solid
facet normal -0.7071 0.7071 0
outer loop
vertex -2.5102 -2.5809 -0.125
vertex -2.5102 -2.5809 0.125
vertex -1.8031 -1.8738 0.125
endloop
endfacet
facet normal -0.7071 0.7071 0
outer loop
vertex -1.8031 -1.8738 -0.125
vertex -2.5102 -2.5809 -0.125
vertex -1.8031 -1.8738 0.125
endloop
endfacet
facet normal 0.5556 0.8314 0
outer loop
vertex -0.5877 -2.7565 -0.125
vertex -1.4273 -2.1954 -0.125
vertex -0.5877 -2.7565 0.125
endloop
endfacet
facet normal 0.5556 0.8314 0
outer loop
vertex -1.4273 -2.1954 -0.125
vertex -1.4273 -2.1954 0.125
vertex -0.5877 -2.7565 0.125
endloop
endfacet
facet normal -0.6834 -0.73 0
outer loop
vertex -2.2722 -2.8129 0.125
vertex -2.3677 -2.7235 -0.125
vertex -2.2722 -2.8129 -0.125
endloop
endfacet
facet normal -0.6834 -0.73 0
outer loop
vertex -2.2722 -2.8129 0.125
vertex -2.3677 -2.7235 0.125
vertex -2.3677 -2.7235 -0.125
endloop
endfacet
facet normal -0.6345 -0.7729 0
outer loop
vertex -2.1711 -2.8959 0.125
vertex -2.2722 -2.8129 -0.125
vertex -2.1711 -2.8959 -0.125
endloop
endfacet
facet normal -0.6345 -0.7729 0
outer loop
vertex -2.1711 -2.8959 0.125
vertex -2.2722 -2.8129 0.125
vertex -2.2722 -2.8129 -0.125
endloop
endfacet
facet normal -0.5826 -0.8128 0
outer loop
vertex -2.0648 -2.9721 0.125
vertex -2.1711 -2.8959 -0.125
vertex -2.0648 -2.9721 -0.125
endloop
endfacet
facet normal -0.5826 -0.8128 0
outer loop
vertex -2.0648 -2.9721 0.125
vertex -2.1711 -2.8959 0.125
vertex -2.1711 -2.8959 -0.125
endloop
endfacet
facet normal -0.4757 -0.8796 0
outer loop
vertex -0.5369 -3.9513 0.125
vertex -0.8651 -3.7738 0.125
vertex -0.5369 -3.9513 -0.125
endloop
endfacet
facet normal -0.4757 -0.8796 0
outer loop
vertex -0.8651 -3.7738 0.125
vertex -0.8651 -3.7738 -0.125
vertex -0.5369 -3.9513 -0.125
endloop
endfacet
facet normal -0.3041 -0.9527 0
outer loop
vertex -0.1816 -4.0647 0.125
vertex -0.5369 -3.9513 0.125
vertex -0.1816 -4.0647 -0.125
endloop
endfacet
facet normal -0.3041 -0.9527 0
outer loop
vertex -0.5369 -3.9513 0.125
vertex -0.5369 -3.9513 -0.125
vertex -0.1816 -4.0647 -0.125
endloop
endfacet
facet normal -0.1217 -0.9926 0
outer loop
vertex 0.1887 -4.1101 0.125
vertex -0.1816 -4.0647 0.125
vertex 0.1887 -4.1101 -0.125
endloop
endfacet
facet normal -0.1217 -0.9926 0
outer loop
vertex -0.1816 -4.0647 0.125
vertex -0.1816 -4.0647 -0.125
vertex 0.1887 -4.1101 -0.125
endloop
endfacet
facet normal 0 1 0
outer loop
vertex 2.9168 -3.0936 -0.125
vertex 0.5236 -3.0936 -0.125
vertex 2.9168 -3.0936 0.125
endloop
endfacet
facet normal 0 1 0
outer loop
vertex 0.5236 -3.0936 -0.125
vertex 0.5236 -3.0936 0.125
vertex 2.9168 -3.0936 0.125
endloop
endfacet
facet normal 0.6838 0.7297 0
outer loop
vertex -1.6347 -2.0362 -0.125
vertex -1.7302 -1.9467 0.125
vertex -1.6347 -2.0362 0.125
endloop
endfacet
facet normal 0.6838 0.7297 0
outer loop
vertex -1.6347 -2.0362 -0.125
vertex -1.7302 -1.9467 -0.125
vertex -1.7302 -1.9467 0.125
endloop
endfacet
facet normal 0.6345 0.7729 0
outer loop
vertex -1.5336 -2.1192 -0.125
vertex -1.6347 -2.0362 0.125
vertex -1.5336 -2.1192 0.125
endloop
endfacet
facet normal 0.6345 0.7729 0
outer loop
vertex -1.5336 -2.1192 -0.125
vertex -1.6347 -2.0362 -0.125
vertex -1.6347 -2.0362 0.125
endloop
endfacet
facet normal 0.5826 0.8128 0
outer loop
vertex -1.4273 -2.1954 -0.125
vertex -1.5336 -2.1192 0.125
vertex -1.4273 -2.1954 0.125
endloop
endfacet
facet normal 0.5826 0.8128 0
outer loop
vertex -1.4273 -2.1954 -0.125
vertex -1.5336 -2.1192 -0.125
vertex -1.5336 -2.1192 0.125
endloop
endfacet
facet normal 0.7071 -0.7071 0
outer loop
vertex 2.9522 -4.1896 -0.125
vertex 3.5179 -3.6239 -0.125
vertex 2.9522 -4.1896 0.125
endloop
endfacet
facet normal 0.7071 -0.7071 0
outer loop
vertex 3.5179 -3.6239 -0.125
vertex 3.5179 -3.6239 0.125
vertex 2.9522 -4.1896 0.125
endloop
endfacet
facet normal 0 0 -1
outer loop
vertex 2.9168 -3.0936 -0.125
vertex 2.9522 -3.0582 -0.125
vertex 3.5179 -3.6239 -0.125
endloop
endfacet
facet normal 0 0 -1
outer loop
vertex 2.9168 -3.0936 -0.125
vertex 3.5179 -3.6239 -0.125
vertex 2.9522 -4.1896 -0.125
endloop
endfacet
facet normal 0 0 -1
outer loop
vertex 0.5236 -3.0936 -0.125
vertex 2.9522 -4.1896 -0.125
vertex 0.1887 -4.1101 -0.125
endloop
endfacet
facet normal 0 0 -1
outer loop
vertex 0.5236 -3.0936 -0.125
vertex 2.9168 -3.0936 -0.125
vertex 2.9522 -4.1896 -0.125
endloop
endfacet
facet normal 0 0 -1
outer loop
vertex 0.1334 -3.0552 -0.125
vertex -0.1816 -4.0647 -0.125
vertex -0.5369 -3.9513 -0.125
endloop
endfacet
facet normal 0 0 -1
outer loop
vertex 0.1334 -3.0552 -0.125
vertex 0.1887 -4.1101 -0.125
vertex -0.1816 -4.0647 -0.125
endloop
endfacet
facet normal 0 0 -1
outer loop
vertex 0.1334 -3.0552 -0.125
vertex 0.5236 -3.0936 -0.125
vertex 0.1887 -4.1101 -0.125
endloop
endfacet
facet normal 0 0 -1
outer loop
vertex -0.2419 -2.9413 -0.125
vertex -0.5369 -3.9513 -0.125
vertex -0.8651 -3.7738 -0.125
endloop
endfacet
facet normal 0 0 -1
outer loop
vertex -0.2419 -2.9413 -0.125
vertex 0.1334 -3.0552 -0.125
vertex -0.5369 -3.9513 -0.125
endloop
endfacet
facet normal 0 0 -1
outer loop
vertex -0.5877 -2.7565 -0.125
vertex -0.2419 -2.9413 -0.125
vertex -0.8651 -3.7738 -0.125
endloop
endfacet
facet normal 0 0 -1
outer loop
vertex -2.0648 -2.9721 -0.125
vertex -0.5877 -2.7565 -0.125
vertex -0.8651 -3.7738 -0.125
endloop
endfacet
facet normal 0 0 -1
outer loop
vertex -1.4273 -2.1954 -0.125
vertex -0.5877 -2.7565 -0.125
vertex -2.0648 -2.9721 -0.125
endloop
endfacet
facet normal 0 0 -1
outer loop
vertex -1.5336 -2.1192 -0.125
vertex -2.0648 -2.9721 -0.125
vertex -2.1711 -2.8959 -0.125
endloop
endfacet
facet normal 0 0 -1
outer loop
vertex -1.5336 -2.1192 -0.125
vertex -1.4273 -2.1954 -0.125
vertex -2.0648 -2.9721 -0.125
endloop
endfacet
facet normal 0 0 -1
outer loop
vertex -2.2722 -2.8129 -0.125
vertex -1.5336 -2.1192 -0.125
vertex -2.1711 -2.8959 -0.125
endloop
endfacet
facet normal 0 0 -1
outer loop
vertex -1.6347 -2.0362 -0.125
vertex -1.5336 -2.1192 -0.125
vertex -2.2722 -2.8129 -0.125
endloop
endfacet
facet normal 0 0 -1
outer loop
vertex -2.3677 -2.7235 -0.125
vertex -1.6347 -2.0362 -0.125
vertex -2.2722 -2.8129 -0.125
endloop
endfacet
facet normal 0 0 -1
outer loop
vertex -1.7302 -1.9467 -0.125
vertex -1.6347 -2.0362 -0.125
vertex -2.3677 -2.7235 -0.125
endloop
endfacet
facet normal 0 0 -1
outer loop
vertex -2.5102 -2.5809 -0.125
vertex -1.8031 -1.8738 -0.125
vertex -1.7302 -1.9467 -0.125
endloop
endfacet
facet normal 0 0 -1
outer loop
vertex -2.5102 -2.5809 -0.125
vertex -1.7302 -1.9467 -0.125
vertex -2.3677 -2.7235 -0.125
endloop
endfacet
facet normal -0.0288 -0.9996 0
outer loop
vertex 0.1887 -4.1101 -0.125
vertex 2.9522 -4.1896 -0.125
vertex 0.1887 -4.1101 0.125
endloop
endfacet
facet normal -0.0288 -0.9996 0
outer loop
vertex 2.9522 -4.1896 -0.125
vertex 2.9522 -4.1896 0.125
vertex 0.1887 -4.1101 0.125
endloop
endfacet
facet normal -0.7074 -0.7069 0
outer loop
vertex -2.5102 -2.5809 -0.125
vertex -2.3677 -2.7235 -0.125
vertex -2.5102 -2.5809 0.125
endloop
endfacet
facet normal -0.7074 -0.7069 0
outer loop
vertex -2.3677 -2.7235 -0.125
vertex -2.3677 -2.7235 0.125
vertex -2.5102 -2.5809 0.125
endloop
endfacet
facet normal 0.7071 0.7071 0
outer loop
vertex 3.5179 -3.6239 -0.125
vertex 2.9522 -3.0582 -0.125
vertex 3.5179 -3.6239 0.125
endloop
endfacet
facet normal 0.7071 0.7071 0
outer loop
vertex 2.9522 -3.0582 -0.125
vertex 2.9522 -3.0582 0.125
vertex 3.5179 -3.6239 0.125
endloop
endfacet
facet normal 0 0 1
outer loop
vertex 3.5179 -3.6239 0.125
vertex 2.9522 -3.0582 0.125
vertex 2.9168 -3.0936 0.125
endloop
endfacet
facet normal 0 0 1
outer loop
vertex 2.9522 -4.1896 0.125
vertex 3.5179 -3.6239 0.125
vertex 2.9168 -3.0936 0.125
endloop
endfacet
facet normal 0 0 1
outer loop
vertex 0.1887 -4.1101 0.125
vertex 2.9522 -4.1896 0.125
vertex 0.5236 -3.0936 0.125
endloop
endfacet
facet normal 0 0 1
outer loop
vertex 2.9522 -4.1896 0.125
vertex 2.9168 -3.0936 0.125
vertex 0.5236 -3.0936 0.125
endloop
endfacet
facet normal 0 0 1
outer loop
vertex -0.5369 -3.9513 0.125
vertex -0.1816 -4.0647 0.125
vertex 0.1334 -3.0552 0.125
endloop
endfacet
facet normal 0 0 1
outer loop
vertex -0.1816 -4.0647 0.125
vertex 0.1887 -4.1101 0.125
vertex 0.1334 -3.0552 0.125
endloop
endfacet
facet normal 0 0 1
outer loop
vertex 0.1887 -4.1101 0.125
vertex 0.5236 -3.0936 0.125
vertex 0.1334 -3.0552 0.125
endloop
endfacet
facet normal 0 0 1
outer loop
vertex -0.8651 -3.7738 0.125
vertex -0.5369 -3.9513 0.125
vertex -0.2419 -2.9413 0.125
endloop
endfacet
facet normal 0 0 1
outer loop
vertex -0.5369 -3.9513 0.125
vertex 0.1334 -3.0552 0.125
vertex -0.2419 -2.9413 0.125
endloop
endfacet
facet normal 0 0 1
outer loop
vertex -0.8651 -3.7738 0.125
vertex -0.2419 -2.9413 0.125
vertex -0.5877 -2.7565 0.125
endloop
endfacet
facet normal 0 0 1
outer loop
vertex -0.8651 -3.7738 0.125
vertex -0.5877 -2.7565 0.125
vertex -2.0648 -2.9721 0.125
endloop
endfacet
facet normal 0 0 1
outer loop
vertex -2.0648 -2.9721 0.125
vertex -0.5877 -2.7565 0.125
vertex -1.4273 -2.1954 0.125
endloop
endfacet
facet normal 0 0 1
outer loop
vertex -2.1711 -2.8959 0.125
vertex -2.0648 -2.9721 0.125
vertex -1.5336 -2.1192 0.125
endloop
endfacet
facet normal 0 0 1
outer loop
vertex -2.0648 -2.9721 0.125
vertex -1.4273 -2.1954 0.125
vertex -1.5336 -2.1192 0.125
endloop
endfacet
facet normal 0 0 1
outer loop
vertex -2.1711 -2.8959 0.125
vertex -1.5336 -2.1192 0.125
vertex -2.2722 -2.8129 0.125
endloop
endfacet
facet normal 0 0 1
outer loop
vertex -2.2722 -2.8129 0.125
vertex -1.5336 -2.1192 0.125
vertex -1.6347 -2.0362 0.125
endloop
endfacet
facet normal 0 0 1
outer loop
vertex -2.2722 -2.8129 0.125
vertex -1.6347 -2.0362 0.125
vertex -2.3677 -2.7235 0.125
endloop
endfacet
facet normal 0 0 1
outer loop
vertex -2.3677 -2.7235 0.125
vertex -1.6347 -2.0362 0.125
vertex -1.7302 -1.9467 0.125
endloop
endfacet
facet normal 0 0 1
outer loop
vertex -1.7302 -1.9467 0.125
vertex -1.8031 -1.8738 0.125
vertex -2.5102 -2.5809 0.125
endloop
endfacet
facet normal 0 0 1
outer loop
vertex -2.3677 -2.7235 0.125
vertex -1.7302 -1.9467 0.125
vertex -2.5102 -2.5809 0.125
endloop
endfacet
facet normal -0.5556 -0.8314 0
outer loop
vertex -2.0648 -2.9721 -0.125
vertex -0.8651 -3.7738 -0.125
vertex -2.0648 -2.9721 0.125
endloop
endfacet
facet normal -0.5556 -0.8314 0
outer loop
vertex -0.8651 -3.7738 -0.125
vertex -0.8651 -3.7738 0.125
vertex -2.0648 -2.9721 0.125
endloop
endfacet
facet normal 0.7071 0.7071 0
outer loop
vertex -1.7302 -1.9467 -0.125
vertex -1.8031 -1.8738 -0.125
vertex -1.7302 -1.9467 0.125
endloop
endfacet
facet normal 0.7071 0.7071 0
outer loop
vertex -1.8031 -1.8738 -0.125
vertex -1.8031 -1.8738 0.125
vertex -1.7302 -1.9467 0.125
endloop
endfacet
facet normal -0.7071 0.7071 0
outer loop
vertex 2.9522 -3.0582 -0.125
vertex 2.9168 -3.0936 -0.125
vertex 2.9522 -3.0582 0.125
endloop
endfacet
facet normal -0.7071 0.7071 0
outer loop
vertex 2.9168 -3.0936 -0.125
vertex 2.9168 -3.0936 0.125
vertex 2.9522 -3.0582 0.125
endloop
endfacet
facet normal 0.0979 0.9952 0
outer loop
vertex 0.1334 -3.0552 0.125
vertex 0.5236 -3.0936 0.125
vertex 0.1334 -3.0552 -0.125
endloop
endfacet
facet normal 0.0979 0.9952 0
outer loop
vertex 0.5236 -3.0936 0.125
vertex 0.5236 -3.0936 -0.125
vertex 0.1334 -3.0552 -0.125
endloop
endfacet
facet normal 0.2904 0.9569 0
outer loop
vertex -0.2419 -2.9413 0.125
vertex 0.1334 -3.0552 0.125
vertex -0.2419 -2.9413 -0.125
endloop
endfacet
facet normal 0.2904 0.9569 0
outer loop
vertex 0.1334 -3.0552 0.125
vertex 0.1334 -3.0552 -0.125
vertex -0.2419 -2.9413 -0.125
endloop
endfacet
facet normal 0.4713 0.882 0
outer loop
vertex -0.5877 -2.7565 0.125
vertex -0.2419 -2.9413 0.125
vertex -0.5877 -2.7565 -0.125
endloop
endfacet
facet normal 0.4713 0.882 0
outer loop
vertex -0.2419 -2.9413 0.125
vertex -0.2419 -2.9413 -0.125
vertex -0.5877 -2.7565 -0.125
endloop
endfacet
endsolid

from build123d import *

# Parameters (mm, degrees)
BOSS_EXTRUDE1_DEPTH = 0.125
FILLET1_R           = 2


with BuildPart() as part:
    # frame_outline → Boss-Extrude1 (new, symmetric)
    with BuildSketch(Plane.XY):
        Polygon((-1.803122292, -1.87383297), (-1.590990258, -2.085965005), (-0.083184528, -3.093592168), (2.916815472, -3.093592168), (2.952170811, -3.058236829), (3.517856236, -3.623922254), (2.952170811, -4.189607679), (-0.386567156, -4.093592168), (-2.2284766, -2.862692224), (-2.510229073, -2.580939751), align=None)
    extrude(amount=BOSS_EXTRUDE1_DEPTH, both=True)

    # Fillet1
    fillet1_edges = [part.edges().sort_by_distance(p)[0] for p in [
        (-2.2284766, -2.862692224, 0),
        (-1.590990258, -2.085965005, 0),
        (-0.083184528, -3.093592168, 0),
        (-0.386567156, -4.093592168, 0),
    ]]
    fillet(fillet1_edges, radius=FILLET1_R)


solid = part.part
